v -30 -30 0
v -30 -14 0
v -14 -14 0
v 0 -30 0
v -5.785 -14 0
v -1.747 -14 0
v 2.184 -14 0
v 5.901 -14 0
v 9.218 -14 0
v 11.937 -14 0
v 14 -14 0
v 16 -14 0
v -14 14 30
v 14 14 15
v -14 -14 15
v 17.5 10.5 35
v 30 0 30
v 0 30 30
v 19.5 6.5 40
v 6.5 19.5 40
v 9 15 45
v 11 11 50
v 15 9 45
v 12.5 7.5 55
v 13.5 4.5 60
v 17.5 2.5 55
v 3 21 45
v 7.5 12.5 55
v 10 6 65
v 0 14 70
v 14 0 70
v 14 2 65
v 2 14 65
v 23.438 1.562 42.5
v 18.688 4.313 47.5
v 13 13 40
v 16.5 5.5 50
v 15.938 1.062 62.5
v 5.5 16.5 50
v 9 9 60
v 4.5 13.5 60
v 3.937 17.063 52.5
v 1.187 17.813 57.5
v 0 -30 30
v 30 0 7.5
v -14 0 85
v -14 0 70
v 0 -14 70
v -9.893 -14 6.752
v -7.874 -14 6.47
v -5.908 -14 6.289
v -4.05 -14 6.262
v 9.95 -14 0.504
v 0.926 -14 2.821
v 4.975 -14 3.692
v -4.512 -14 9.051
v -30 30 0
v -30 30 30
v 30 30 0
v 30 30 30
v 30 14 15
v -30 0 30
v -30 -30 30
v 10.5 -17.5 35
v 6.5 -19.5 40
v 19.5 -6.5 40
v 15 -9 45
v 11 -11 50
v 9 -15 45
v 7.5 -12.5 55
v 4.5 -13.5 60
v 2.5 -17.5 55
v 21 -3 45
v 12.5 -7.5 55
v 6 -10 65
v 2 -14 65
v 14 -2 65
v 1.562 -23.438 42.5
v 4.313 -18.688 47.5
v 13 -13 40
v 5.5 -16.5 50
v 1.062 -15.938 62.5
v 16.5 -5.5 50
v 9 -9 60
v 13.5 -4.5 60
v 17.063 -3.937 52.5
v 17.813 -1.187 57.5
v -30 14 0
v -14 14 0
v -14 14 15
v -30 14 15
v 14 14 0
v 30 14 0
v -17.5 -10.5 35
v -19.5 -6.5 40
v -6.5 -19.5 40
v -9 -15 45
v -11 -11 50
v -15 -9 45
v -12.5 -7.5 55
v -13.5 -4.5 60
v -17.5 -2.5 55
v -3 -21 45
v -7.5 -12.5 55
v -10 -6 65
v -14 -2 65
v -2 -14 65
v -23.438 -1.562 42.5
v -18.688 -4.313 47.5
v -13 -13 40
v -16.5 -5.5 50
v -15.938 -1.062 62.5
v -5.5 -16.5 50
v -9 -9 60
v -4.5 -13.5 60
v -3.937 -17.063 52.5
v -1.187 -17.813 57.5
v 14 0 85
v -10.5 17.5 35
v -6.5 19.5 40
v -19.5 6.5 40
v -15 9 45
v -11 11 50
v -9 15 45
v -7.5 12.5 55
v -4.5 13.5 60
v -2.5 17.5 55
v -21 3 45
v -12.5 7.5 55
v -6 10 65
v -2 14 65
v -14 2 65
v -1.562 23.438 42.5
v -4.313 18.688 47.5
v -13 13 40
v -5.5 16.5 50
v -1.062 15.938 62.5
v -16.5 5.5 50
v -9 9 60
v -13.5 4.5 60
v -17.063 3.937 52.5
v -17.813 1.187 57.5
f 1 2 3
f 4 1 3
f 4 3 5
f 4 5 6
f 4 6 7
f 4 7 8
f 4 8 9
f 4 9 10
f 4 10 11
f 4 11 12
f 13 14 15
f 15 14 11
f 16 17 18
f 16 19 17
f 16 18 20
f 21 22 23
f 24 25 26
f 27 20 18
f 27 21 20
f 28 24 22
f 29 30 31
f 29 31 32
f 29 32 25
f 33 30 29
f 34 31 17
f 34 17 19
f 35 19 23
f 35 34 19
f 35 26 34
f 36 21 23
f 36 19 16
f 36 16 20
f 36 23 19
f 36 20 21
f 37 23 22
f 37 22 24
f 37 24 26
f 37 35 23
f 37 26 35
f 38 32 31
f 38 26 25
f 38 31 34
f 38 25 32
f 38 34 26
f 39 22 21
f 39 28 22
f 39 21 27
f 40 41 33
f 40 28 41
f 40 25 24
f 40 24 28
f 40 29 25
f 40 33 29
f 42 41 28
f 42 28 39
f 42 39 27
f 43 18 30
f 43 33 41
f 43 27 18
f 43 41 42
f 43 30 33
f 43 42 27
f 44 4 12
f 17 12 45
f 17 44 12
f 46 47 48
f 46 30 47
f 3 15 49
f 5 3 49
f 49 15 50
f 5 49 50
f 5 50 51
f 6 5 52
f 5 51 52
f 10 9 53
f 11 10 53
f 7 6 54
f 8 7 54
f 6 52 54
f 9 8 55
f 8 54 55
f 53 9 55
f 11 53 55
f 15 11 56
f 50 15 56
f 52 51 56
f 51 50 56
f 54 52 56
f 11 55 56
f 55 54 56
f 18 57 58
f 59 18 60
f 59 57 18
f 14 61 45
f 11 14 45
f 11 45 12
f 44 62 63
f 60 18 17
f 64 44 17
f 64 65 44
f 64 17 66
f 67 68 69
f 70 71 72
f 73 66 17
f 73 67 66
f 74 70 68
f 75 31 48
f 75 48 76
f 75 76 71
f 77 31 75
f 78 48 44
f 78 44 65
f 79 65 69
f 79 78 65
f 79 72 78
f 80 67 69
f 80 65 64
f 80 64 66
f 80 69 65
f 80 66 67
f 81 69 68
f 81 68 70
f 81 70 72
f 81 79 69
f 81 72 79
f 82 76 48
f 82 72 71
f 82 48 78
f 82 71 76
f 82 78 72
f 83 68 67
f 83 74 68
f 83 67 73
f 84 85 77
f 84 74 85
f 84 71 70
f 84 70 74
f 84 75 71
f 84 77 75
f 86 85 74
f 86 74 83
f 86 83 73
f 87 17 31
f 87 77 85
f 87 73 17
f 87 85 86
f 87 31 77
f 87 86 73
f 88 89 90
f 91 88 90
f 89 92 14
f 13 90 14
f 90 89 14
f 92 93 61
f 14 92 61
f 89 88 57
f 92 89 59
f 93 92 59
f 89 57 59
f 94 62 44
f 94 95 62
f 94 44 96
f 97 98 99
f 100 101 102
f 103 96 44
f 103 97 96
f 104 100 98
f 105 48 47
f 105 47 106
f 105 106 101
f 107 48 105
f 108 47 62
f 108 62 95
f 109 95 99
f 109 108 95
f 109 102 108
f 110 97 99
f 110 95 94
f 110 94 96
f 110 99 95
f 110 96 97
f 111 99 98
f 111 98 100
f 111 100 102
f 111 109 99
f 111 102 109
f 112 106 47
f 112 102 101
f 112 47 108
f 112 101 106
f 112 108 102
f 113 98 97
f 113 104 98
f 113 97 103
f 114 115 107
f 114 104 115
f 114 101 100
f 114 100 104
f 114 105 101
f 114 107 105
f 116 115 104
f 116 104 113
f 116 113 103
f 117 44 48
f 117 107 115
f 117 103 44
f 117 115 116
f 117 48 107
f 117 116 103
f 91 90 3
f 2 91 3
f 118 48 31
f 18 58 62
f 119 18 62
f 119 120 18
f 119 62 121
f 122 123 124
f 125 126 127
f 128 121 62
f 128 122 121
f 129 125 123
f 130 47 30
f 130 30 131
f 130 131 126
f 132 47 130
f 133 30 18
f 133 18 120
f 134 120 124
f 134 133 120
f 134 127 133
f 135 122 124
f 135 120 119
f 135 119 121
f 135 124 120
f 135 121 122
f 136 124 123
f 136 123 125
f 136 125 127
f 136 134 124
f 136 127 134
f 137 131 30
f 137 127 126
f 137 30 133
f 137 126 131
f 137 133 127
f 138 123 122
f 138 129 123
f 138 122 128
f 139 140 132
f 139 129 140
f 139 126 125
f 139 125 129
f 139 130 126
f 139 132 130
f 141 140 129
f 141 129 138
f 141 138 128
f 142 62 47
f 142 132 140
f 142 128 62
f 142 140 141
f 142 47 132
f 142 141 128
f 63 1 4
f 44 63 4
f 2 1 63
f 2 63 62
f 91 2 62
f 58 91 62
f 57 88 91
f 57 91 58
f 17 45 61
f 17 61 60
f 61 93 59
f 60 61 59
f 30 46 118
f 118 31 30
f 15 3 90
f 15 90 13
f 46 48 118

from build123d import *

# Parameters (mm, degrees)
F0_W          = 60
F0_H          = 60
F1_DEPTH      = 30
F6_DEPTH      = 15
F8_DEPTH      = 14.001
F8_DEPTH_BACK = 14.001
F9_DEPTH      = 30.001
F19_DEPTH     = 60


with BuildPart() as f1:
    # F0 (on Top) → F1 (new body)
    with BuildSketch(Plane.XY):
        Rectangle(F0_W, F0_H)
    extrude(amount=F1_DEPTH)

    # F2 (on face) → F5 section 0
    with BuildSketch(Plane.XY.offset(30)):
        Polygon((30, 0), (0, 30), (-30, 0), (0, -30), align=None)
    # F4 (on offset) → F5 section 1
    with BuildSketch(Plane.XY.offset(70)):
        Polygon((14, 0), (0, 14), (-14, 0), (0, -14), align=None)
    loft()

    # F6 (add): a face of the model
    f6_faces = [f1.faces().sort_by_distance(p)[0] for p in [
        (0, 0, 70),
    ]]
    extrude(f6_faces, amount=F6_DEPTH)

    # F7 (on Right) → F8 (cut, two sides)
    with BuildSketch(Plane.YZ) as f8_sk:
        Polygon((14, 85), (0, 85), (14, 70), align=None)
        Polygon((0, 85), (-14, 85), (-14, 70), align=None)
    extrude(amount=-F8_DEPTH, mode=Mode.SUBTRACT)
    extrude(f8_sk.sketch, amount=F8_DEPTH_BACK, mode=Mode.SUBTRACT)

    # F9 (cut, through all): a face of the model
    f9_faces = [f1.faces().sort_by_distance(p)[0] for p in [
        (20, -20, 30),
    ]]
    extrude(f9_faces, amount=-F9_DEPTH, mode=Mode.SUBTRACT)

    # F13 (on offset) → F17 section 0
    with BuildSketch(Plane.YZ.offset(-14)):
        Polygon((14, -5), (14, 0), (14, 30), (-14, 15), (-14, 0), (-14, -5), align=None)
    # F11 (on offset) → F17 section 1
    with BuildSketch(Plane.YZ.offset(14)):
        Polygon((14, 15), (-14, 0), (-14, -5), (14, -5), (14, 0), align=None)
    loft(mode=Mode.SUBTRACT)

    # F18 (on face) → F19 (cut, through all)
    with BuildSketch(Plane.YZ.offset(30)):
        Polygon((14, 0), (14, 15), (0, 7.5), (0, 0), align=None)
        Polygon((0, 0), (0, 7.5), (-14, 0), align=None)
    extrude(amount=-F19_DEPTH, mode=Mode.SUBTRACT)


solid = f1.part
